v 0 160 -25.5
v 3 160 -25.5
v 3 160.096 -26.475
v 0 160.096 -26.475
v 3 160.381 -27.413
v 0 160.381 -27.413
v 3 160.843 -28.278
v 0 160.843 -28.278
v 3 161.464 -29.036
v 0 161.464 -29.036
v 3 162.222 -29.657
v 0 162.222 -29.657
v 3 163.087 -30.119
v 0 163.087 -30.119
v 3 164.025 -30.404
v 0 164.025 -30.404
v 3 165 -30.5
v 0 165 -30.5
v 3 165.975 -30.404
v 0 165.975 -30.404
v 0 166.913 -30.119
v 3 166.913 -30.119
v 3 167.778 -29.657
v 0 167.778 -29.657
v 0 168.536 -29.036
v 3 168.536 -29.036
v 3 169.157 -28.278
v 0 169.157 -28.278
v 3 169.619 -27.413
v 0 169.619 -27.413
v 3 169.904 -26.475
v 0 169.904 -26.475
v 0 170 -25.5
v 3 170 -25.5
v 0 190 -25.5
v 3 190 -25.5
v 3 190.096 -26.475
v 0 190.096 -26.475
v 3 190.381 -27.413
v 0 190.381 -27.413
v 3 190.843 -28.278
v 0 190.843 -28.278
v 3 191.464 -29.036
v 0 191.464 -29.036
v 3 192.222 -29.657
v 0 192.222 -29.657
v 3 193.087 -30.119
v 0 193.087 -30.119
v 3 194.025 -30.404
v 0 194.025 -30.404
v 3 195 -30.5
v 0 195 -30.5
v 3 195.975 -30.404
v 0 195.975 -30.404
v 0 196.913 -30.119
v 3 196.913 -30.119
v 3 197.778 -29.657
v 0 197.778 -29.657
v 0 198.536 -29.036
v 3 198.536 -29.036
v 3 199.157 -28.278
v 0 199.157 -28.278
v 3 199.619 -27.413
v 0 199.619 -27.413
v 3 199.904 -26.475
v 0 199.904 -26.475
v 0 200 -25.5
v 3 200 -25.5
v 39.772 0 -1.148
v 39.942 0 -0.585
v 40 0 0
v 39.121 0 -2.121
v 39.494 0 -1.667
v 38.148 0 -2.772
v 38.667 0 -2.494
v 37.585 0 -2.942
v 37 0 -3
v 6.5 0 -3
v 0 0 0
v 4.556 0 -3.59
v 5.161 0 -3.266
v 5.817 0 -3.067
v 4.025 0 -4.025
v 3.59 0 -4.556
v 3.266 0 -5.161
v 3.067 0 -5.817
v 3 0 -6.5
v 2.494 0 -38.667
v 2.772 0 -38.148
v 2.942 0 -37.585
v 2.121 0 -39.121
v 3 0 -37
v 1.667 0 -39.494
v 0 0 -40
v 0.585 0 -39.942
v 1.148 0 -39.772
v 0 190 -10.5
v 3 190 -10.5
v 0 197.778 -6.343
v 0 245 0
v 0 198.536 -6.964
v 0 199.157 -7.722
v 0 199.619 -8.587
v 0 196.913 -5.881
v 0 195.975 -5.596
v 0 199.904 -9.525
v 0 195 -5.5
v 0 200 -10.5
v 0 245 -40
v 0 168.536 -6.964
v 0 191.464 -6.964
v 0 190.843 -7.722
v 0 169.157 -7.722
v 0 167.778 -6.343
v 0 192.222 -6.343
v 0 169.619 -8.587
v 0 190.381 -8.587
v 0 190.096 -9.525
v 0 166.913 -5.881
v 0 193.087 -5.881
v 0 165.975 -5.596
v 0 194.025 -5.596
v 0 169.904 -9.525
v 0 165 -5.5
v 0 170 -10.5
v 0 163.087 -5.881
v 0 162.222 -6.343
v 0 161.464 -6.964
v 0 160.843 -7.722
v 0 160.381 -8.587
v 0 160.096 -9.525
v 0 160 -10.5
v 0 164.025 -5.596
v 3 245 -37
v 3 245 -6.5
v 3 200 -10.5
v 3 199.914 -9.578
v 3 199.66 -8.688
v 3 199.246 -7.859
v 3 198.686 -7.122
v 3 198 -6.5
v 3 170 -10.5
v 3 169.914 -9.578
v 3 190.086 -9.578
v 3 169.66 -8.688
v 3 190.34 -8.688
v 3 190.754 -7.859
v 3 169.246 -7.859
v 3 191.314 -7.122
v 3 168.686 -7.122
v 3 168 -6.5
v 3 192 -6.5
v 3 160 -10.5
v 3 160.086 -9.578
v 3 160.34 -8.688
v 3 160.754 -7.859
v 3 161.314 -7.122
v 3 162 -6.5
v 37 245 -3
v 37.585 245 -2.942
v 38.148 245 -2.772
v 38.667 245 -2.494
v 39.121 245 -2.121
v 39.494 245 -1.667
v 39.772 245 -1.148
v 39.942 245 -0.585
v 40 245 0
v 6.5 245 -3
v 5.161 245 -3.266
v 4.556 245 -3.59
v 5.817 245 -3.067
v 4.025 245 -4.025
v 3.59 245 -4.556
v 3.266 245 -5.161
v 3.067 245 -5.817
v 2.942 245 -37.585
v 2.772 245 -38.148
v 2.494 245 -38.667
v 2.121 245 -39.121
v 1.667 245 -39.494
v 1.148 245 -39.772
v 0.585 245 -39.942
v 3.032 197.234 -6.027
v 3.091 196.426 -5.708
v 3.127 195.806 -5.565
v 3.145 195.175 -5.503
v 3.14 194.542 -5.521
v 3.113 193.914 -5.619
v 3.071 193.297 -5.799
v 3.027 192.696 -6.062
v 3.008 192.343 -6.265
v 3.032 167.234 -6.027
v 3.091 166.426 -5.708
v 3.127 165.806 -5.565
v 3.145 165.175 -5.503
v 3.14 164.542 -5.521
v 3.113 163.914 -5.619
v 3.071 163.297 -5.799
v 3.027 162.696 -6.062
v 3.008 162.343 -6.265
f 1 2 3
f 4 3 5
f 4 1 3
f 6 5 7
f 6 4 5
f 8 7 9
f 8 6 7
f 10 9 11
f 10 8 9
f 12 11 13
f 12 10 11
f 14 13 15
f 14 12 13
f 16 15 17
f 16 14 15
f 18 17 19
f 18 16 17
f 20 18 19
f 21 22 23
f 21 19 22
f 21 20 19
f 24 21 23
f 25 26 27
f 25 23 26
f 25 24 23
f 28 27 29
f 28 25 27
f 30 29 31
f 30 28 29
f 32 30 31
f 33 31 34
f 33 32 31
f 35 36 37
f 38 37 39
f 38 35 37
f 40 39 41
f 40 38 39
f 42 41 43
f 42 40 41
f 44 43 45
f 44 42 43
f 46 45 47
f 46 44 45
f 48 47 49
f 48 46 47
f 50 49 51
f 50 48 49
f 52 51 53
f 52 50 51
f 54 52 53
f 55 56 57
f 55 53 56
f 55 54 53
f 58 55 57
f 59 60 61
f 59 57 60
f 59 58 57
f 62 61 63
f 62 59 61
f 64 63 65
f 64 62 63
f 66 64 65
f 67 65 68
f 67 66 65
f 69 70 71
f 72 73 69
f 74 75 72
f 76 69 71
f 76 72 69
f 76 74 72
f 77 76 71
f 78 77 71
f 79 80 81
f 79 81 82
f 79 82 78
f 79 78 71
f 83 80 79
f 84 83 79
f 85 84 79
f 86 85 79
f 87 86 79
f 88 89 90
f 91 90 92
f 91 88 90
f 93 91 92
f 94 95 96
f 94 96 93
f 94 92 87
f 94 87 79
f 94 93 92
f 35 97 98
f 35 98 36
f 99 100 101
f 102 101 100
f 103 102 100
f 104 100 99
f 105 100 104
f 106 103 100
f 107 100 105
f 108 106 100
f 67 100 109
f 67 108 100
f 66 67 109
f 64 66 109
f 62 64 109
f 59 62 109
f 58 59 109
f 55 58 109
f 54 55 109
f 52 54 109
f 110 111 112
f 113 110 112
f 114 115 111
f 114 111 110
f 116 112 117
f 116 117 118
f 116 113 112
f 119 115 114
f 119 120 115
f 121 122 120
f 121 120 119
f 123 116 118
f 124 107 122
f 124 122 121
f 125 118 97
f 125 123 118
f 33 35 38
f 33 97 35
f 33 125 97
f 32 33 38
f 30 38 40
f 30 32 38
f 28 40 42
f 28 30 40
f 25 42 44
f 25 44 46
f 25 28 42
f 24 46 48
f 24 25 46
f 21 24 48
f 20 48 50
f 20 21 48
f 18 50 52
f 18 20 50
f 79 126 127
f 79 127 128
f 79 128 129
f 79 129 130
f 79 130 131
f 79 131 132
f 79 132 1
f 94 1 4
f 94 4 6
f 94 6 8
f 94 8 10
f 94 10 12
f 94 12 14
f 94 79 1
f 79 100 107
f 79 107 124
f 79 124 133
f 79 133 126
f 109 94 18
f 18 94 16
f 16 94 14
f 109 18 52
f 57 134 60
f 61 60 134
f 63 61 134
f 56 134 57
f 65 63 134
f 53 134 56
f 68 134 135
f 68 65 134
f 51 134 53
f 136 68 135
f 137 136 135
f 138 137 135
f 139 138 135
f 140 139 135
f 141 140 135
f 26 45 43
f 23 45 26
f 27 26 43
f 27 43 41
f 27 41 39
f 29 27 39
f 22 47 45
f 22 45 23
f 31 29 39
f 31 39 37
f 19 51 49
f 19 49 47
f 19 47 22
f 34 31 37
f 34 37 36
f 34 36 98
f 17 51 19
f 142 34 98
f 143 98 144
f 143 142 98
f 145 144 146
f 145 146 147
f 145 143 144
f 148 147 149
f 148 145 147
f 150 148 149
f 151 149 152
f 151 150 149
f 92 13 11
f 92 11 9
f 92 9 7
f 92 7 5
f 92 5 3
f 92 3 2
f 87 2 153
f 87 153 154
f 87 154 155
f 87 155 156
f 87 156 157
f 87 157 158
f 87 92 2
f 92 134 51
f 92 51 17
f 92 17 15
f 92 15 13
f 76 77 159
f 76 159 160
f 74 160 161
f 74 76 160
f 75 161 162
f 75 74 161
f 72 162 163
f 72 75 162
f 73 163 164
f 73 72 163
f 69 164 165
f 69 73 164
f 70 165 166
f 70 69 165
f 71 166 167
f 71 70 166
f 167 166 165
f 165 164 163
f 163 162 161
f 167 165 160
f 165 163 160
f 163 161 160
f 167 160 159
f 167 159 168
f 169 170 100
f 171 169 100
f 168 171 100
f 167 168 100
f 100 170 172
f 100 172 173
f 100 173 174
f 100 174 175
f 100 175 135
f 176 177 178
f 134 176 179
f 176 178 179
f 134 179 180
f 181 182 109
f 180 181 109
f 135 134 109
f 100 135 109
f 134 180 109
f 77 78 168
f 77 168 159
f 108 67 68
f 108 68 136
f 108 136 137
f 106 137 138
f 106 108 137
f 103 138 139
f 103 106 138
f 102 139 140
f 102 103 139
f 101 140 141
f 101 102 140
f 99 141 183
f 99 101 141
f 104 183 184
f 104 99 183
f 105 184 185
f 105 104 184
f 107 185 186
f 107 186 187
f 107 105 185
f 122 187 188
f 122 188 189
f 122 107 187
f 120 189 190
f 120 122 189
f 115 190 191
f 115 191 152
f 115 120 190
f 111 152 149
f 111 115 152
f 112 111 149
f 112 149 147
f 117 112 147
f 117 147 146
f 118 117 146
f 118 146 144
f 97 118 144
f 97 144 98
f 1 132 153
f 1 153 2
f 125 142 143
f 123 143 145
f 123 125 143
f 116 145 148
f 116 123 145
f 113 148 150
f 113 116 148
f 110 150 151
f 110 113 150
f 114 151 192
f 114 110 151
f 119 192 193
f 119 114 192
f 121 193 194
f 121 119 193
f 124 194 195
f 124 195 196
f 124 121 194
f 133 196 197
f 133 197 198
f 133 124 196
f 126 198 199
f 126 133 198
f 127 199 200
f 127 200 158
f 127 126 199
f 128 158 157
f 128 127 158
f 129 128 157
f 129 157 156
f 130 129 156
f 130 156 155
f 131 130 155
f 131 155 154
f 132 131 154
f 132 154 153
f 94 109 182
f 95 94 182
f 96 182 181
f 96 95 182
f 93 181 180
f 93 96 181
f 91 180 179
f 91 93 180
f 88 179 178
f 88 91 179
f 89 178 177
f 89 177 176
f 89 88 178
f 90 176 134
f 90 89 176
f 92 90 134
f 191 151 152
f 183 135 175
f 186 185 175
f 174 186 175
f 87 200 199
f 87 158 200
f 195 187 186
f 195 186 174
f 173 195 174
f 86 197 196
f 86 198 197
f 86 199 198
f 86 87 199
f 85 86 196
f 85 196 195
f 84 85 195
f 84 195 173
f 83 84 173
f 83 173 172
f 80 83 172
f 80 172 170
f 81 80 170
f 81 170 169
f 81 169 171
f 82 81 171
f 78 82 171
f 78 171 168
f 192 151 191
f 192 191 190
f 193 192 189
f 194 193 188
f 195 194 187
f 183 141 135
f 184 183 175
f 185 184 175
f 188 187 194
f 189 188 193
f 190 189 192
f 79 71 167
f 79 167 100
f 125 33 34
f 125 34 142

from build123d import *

# Parameters (mm, degrees)
IRON_V40X40X3_1_DEPTH = 245
CUT_EXTRUDE1_DEPTH    = 10


with BuildPart() as part:
    # Sketch1 → Iron V40X40X3(1) (new body)
    with BuildSketch(Plane(origin=(0, 0, 0), x_dir=(1, 0, 0), z_dir=(0, 1, 0))):
        with BuildLine():
            Line((0, 0), (0, 40))
            ThreePointArc((0, 40), (2.121320344, 39.121320344), (3, 37))
            Line((3, 37), (3, 6.5))
            ThreePointArc((3, 6.5), (4.025126266, 4.025126266), (6.5, 3))
            Line((6.5, 3), (37, 3))
            ThreePointArc((37, 3), (39.121320344, 2.121320344), (40, 0))
            Line((40, 0), (0, 0))
        make_face()
    extrude(amount=IRON_V40X40X3_1_DEPTH)

    # Sketch2 → Cut-Extrude1 (cut)
    with BuildSketch(Plane.ZY):
        with BuildLine():
            Line((-25.5, 170), (-10.5, 170))
            ThreePointArc((-10.5, 170), (-5.5, 165), (-10.5, 160))
            Line((-10.5, 160), (-25.5, 160))
            ThreePointArc((-25.5, 160), (-30.5, 165), (-25.5, 170))
        make_face()
        with BuildLine():
            Line((-25.5, 200), (-10.5, 200))
            ThreePointArc((-10.5, 200), (-5.5, 195), (-10.5, 190))
            Line((-10.5, 190), (-25.5, 190))
            ThreePointArc((-25.5, 190), (-30.5, 195), (-25.5, 200))
        make_face()
    extrude(amount=-CUT_EXTRUDE1_DEPTH, mode=Mode.SUBTRACT)


solid = part.part
